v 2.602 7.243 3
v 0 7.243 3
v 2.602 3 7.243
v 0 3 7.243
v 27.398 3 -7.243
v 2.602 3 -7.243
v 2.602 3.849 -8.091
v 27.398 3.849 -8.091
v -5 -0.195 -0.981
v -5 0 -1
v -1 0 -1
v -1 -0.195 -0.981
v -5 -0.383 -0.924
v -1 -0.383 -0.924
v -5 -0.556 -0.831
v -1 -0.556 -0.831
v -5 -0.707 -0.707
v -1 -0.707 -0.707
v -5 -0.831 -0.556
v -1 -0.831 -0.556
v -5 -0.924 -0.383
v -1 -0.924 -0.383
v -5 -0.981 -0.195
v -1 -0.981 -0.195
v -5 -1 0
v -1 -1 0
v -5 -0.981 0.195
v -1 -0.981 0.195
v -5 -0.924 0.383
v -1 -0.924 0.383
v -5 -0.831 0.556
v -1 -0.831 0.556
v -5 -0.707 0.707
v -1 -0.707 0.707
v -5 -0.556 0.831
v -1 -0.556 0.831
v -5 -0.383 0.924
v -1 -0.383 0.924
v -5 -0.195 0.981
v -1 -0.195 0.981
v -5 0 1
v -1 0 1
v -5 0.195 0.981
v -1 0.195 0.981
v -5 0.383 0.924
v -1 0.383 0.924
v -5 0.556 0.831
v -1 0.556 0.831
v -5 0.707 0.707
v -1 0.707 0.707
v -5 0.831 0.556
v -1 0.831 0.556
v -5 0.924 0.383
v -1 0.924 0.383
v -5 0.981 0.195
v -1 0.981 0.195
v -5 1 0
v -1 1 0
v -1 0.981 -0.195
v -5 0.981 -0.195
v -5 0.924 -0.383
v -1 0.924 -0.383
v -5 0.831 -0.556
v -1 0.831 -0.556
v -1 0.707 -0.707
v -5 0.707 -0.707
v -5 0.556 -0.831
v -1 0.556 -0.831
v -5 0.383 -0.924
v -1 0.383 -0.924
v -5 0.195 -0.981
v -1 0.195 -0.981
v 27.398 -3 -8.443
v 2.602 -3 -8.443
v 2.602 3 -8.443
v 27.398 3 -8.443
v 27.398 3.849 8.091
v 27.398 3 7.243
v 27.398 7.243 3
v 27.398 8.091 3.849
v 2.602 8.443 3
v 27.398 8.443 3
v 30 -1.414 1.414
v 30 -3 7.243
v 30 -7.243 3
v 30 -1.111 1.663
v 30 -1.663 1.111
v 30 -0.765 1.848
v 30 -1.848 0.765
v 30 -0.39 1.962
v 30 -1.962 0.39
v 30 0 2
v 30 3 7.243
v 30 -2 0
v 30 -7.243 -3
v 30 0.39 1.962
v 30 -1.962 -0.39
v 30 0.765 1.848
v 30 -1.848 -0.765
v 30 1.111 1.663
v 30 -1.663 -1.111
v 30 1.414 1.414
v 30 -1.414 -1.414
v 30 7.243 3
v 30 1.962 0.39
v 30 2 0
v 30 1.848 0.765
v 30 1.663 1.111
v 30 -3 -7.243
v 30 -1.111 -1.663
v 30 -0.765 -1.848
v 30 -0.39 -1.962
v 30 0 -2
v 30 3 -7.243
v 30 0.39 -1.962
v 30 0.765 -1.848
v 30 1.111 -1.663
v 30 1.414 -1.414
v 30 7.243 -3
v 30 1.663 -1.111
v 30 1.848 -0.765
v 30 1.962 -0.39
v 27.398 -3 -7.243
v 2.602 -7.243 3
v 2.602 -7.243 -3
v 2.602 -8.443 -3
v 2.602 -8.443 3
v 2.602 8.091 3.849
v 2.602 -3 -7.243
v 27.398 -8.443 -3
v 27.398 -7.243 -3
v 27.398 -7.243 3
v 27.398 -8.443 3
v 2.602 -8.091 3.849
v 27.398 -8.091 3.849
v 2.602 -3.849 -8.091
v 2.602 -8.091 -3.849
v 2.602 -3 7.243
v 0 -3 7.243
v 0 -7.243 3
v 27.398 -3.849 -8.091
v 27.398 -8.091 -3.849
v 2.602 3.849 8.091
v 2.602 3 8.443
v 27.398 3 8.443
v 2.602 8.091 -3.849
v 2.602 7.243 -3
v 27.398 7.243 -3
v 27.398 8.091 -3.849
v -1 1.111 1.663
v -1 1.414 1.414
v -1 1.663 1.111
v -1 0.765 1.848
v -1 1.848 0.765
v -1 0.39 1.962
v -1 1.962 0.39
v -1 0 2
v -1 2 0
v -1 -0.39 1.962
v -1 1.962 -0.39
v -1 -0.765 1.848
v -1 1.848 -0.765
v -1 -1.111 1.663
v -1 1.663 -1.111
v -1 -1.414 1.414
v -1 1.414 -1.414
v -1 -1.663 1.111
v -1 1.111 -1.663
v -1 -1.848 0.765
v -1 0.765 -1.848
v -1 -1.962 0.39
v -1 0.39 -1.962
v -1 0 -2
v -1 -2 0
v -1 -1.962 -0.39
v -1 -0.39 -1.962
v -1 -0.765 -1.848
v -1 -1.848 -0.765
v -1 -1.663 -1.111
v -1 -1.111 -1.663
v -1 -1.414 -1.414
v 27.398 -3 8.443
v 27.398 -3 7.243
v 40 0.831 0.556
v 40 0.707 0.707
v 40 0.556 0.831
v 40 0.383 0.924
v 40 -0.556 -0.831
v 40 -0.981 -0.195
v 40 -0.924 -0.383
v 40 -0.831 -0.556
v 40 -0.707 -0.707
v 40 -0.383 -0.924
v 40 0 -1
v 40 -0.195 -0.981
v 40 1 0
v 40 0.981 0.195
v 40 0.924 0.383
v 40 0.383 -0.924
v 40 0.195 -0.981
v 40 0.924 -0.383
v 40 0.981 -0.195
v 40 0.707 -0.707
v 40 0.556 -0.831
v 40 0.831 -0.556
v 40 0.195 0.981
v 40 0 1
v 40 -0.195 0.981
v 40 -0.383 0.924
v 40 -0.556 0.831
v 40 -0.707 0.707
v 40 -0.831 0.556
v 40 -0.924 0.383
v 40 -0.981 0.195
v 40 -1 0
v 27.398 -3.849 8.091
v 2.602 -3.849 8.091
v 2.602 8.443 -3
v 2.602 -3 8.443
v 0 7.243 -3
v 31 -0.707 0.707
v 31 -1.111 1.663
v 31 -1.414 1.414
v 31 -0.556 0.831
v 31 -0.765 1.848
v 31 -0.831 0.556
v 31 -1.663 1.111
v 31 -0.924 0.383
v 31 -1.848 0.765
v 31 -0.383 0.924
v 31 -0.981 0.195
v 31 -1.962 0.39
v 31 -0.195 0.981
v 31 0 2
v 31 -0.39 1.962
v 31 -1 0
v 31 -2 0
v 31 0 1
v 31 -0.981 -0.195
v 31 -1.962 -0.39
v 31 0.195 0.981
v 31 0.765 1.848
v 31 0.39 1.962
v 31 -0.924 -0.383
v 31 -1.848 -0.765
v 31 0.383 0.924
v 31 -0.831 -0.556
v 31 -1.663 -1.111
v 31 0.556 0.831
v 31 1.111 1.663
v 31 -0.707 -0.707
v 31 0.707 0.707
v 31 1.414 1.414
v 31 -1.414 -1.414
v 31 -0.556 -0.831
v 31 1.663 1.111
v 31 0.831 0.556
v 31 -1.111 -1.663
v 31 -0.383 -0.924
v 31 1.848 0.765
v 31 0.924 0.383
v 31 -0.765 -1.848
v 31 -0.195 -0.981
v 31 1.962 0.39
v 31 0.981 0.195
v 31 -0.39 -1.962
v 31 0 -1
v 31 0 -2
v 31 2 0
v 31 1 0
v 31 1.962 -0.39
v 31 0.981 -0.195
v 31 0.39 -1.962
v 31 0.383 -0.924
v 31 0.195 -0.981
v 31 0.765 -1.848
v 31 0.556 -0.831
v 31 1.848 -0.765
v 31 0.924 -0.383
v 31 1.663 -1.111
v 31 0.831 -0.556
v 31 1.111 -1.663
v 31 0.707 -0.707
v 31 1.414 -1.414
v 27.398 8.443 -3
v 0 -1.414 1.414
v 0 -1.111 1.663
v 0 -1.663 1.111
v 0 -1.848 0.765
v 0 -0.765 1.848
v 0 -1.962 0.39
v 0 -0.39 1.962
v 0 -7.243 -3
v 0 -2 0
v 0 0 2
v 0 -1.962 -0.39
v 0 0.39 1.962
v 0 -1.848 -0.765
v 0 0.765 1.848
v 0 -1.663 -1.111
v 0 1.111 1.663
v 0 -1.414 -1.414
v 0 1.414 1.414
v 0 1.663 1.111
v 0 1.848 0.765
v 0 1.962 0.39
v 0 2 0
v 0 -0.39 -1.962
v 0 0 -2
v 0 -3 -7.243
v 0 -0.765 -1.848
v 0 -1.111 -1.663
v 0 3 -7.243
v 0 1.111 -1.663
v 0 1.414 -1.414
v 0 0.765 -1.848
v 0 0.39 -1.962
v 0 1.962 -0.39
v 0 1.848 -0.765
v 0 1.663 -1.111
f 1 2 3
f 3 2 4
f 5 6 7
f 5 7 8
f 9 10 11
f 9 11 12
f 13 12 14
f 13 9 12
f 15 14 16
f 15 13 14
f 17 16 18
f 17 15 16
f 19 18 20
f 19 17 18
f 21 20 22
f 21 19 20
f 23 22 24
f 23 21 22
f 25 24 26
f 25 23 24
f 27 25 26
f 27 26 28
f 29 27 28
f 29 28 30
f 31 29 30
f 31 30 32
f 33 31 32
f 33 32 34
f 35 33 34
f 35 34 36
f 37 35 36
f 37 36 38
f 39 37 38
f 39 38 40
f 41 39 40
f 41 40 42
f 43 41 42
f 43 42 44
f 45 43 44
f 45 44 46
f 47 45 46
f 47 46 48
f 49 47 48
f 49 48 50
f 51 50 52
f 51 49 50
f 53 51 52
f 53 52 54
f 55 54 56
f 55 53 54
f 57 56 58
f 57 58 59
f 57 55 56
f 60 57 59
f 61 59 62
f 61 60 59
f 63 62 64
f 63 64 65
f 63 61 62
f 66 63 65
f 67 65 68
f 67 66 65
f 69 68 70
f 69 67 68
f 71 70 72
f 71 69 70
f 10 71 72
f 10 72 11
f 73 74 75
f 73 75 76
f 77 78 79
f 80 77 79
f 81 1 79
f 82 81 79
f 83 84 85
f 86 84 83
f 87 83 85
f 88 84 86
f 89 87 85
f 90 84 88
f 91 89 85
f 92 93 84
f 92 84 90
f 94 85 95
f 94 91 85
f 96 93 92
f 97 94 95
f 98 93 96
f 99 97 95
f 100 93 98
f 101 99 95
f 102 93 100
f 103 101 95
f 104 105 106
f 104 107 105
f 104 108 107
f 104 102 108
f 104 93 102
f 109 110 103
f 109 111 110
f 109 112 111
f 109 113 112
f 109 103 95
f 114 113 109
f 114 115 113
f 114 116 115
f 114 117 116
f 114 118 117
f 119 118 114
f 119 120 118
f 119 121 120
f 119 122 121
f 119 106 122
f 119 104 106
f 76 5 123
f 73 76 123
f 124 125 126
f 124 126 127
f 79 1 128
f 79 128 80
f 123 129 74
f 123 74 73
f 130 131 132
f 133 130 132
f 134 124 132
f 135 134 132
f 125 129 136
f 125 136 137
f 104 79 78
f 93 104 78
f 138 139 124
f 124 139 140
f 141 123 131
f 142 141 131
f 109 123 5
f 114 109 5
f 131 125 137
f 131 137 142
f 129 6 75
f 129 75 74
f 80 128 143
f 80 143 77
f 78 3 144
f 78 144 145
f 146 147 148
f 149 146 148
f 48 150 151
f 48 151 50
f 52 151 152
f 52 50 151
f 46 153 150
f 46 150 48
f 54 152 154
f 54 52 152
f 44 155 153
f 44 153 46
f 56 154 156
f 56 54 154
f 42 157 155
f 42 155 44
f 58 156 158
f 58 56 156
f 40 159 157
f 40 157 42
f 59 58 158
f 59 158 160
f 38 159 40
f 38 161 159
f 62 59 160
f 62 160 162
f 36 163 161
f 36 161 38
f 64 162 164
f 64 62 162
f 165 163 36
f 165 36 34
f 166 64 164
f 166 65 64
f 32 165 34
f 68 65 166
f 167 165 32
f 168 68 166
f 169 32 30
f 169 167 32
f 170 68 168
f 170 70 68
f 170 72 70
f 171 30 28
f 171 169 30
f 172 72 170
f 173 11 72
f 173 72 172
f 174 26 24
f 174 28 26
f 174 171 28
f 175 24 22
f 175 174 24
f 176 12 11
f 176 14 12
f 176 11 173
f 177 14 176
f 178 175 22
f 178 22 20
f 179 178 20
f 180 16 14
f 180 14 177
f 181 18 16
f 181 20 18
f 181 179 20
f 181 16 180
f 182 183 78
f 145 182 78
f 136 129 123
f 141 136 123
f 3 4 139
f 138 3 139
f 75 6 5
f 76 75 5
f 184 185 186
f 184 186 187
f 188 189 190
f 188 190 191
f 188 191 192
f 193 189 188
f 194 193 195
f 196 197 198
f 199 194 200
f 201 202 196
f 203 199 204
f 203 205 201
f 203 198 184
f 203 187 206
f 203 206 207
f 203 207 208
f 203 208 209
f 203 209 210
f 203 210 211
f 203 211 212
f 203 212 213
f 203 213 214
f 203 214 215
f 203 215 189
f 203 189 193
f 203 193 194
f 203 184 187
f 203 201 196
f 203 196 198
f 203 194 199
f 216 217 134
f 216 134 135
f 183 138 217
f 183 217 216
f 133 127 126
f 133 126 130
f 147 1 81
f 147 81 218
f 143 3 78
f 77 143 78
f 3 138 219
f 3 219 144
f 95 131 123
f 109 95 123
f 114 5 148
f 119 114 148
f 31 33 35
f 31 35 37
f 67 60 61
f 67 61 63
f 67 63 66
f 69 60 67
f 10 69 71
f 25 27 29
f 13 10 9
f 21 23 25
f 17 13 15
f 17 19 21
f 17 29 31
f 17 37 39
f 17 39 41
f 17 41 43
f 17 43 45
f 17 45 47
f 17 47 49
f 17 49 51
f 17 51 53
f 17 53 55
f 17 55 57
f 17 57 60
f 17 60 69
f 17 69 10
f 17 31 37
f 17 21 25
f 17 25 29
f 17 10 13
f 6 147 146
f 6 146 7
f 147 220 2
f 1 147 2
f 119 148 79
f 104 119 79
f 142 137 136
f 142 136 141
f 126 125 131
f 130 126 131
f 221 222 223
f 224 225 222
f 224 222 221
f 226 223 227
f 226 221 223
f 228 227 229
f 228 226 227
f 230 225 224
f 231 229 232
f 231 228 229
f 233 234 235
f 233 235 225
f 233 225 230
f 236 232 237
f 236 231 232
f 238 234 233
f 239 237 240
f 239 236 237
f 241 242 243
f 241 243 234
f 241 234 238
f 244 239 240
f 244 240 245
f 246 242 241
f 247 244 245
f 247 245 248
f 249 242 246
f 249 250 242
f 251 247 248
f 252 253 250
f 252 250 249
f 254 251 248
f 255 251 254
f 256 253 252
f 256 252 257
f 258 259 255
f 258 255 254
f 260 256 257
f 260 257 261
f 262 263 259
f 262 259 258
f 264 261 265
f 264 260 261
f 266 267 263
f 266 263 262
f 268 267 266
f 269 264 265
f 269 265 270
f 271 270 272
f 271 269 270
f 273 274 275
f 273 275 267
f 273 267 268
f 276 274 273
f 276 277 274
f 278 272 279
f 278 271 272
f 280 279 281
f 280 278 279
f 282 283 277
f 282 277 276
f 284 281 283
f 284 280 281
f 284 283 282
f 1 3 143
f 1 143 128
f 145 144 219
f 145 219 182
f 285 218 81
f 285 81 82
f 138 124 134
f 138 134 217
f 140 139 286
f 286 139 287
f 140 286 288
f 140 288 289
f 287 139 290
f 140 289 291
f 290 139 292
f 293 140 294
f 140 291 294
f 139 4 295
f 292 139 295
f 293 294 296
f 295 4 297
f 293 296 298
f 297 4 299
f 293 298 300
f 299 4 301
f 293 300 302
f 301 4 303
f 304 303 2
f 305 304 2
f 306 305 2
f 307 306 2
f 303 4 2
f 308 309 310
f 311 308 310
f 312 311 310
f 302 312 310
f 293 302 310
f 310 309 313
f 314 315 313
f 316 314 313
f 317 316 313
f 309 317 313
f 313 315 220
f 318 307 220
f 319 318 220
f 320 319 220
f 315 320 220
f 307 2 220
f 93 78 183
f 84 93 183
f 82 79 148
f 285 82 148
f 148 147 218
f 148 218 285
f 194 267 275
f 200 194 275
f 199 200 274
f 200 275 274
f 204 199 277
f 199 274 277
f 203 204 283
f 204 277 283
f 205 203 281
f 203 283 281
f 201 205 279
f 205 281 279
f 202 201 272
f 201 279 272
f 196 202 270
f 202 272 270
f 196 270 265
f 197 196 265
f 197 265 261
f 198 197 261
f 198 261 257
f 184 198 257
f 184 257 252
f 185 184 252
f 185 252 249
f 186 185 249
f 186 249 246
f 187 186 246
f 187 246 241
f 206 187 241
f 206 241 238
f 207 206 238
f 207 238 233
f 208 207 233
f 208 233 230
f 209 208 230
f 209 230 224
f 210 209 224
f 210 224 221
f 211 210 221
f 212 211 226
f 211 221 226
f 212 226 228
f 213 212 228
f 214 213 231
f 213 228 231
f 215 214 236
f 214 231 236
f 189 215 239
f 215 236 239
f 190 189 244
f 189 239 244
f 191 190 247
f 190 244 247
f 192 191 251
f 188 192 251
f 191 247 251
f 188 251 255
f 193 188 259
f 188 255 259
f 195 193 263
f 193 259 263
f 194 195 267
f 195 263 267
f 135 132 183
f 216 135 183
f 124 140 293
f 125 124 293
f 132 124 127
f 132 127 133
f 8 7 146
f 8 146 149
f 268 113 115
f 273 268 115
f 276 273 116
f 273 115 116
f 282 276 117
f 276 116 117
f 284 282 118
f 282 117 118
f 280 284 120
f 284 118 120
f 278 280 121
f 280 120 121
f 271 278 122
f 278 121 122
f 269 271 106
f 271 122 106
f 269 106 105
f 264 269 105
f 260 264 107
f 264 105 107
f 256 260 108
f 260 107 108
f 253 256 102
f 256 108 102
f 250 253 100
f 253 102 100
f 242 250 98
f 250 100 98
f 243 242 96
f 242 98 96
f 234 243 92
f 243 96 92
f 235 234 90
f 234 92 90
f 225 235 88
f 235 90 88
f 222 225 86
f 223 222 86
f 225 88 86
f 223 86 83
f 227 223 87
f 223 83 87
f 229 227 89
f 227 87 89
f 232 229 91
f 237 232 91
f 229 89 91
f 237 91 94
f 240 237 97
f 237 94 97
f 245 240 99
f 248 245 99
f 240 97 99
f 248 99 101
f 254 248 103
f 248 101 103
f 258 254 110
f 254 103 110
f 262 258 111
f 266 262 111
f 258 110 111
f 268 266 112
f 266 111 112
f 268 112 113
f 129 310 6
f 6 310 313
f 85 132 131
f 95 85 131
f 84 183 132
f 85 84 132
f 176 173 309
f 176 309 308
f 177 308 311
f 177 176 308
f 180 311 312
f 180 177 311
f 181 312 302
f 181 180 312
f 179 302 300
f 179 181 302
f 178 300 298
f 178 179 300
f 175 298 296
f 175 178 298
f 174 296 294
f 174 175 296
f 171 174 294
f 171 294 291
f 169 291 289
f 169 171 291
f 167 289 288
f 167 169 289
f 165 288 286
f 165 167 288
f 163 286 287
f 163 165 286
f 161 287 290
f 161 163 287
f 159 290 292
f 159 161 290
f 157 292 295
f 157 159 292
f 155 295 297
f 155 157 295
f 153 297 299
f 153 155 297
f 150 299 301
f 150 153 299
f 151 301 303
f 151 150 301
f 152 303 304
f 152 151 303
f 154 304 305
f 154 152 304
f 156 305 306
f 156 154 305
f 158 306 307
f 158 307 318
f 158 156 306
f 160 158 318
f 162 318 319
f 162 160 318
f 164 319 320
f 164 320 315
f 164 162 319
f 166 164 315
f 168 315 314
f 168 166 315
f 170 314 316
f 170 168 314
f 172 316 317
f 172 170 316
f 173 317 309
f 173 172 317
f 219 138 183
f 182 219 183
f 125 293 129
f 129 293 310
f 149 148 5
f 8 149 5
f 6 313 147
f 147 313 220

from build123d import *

# Parameters (mm, degrees)
EXTRUDE_1_DEPTH          = 30
SKETCH_4_R               = 1
EXTRUDE_2_DEPTH          = 10
SKETCH_5_R               = 2
EXTRUDE_3_DEPTH          = 1
EXTRUDE_START            = 5
SKETCH_6_R               = 1
EXTRUDE_4_DEPTH          = 5
EXTRUDE_START_2          = 1
SKETCH_7_R               = 2
EXTRUDE_5_DEPTH          = 1
SKETCH_8_W               = 24.796417242
SKETCH_8_H               = 6
EXTRUDE_6_DEPTH          = 1.2
PATTERN_CIRCULAR_1_COUNT = 8


with BuildPart() as part:
    # 草图1 → 凸台-拉伸1 (new body)
    with BuildSketch(Plane(origin=(0, 0, 0), x_dir=(0, 0, -1), z_dir=(1, 0, 0))):
        Polygon((7.242640687, -3), (7.242640687, 3), (3, 7.242640687), (-3, 7.242640687), (-7.242640687, 3), (-7.242640687, -3), (-3, -7.242640687), (3, -7.242640687), align=None)
    extrude(amount=EXTRUDE_1_DEPTH)

    # 草图4 → 凸台-拉伸2 (add)
    with BuildSketch(Plane(origin=(30, 0, 0), x_dir=(0, 0, -1), z_dir=(1, 0, 0))):
        Circle(SKETCH_4_R)
    extrude(amount=EXTRUDE_2_DEPTH)

    # 草图5 → 凸台-拉伸3 (add)
    with BuildSketch(Plane(origin=(30, 0, 0), x_dir=(0, 0, -1), z_dir=(1, 0, 0))):
        Circle(SKETCH_5_R)
    extrude(amount=EXTRUDE_3_DEPTH)

    # 草图6 → 凸台-拉伸4 (add)
    with BuildSketch(Plane.ZY.offset(EXTRUDE_START)):
        with Locations(Location((0, 0, 0), (0, 0, 180))):
            Circle(SKETCH_6_R)
    extrude(amount=-EXTRUDE_4_DEPTH)

    # 草图7 → 凸台-拉伸5 (add)
    with BuildSketch(Plane.ZY.offset(EXTRUDE_START_2)):
        with Locations(Location((0, 0, 0), (0, 0, 180))):
            Circle(SKETCH_7_R)
    extrude(amount=-EXTRUDE_5_DEPTH)

    # 草图8 → 凸台-拉伸6 (add)
    with BuildSketch(Plane(origin=(0, 7.242640687, 0), x_dir=(1, 0, 0), z_dir=(0, 1, 0))):
        with Locations((15, 0)):
            Rectangle(SKETCH_8_W, SKETCH_8_H)
    extrude_6 = extrude(amount=EXTRUDE_6_DEPTH)

    # 阵列(圆周)1: 凸台-拉伸6 ×8 about axis
    pattern_circular_1_axis = Axis((0, 0, 0), (1, 0, 0))
    for i in range(1, PATTERN_CIRCULAR_1_COUNT):
        add(extrude_6.rotate(pattern_circular_1_axis, i * 360 / PATTERN_CIRCULAR_1_COUNT))


solid = part.part
